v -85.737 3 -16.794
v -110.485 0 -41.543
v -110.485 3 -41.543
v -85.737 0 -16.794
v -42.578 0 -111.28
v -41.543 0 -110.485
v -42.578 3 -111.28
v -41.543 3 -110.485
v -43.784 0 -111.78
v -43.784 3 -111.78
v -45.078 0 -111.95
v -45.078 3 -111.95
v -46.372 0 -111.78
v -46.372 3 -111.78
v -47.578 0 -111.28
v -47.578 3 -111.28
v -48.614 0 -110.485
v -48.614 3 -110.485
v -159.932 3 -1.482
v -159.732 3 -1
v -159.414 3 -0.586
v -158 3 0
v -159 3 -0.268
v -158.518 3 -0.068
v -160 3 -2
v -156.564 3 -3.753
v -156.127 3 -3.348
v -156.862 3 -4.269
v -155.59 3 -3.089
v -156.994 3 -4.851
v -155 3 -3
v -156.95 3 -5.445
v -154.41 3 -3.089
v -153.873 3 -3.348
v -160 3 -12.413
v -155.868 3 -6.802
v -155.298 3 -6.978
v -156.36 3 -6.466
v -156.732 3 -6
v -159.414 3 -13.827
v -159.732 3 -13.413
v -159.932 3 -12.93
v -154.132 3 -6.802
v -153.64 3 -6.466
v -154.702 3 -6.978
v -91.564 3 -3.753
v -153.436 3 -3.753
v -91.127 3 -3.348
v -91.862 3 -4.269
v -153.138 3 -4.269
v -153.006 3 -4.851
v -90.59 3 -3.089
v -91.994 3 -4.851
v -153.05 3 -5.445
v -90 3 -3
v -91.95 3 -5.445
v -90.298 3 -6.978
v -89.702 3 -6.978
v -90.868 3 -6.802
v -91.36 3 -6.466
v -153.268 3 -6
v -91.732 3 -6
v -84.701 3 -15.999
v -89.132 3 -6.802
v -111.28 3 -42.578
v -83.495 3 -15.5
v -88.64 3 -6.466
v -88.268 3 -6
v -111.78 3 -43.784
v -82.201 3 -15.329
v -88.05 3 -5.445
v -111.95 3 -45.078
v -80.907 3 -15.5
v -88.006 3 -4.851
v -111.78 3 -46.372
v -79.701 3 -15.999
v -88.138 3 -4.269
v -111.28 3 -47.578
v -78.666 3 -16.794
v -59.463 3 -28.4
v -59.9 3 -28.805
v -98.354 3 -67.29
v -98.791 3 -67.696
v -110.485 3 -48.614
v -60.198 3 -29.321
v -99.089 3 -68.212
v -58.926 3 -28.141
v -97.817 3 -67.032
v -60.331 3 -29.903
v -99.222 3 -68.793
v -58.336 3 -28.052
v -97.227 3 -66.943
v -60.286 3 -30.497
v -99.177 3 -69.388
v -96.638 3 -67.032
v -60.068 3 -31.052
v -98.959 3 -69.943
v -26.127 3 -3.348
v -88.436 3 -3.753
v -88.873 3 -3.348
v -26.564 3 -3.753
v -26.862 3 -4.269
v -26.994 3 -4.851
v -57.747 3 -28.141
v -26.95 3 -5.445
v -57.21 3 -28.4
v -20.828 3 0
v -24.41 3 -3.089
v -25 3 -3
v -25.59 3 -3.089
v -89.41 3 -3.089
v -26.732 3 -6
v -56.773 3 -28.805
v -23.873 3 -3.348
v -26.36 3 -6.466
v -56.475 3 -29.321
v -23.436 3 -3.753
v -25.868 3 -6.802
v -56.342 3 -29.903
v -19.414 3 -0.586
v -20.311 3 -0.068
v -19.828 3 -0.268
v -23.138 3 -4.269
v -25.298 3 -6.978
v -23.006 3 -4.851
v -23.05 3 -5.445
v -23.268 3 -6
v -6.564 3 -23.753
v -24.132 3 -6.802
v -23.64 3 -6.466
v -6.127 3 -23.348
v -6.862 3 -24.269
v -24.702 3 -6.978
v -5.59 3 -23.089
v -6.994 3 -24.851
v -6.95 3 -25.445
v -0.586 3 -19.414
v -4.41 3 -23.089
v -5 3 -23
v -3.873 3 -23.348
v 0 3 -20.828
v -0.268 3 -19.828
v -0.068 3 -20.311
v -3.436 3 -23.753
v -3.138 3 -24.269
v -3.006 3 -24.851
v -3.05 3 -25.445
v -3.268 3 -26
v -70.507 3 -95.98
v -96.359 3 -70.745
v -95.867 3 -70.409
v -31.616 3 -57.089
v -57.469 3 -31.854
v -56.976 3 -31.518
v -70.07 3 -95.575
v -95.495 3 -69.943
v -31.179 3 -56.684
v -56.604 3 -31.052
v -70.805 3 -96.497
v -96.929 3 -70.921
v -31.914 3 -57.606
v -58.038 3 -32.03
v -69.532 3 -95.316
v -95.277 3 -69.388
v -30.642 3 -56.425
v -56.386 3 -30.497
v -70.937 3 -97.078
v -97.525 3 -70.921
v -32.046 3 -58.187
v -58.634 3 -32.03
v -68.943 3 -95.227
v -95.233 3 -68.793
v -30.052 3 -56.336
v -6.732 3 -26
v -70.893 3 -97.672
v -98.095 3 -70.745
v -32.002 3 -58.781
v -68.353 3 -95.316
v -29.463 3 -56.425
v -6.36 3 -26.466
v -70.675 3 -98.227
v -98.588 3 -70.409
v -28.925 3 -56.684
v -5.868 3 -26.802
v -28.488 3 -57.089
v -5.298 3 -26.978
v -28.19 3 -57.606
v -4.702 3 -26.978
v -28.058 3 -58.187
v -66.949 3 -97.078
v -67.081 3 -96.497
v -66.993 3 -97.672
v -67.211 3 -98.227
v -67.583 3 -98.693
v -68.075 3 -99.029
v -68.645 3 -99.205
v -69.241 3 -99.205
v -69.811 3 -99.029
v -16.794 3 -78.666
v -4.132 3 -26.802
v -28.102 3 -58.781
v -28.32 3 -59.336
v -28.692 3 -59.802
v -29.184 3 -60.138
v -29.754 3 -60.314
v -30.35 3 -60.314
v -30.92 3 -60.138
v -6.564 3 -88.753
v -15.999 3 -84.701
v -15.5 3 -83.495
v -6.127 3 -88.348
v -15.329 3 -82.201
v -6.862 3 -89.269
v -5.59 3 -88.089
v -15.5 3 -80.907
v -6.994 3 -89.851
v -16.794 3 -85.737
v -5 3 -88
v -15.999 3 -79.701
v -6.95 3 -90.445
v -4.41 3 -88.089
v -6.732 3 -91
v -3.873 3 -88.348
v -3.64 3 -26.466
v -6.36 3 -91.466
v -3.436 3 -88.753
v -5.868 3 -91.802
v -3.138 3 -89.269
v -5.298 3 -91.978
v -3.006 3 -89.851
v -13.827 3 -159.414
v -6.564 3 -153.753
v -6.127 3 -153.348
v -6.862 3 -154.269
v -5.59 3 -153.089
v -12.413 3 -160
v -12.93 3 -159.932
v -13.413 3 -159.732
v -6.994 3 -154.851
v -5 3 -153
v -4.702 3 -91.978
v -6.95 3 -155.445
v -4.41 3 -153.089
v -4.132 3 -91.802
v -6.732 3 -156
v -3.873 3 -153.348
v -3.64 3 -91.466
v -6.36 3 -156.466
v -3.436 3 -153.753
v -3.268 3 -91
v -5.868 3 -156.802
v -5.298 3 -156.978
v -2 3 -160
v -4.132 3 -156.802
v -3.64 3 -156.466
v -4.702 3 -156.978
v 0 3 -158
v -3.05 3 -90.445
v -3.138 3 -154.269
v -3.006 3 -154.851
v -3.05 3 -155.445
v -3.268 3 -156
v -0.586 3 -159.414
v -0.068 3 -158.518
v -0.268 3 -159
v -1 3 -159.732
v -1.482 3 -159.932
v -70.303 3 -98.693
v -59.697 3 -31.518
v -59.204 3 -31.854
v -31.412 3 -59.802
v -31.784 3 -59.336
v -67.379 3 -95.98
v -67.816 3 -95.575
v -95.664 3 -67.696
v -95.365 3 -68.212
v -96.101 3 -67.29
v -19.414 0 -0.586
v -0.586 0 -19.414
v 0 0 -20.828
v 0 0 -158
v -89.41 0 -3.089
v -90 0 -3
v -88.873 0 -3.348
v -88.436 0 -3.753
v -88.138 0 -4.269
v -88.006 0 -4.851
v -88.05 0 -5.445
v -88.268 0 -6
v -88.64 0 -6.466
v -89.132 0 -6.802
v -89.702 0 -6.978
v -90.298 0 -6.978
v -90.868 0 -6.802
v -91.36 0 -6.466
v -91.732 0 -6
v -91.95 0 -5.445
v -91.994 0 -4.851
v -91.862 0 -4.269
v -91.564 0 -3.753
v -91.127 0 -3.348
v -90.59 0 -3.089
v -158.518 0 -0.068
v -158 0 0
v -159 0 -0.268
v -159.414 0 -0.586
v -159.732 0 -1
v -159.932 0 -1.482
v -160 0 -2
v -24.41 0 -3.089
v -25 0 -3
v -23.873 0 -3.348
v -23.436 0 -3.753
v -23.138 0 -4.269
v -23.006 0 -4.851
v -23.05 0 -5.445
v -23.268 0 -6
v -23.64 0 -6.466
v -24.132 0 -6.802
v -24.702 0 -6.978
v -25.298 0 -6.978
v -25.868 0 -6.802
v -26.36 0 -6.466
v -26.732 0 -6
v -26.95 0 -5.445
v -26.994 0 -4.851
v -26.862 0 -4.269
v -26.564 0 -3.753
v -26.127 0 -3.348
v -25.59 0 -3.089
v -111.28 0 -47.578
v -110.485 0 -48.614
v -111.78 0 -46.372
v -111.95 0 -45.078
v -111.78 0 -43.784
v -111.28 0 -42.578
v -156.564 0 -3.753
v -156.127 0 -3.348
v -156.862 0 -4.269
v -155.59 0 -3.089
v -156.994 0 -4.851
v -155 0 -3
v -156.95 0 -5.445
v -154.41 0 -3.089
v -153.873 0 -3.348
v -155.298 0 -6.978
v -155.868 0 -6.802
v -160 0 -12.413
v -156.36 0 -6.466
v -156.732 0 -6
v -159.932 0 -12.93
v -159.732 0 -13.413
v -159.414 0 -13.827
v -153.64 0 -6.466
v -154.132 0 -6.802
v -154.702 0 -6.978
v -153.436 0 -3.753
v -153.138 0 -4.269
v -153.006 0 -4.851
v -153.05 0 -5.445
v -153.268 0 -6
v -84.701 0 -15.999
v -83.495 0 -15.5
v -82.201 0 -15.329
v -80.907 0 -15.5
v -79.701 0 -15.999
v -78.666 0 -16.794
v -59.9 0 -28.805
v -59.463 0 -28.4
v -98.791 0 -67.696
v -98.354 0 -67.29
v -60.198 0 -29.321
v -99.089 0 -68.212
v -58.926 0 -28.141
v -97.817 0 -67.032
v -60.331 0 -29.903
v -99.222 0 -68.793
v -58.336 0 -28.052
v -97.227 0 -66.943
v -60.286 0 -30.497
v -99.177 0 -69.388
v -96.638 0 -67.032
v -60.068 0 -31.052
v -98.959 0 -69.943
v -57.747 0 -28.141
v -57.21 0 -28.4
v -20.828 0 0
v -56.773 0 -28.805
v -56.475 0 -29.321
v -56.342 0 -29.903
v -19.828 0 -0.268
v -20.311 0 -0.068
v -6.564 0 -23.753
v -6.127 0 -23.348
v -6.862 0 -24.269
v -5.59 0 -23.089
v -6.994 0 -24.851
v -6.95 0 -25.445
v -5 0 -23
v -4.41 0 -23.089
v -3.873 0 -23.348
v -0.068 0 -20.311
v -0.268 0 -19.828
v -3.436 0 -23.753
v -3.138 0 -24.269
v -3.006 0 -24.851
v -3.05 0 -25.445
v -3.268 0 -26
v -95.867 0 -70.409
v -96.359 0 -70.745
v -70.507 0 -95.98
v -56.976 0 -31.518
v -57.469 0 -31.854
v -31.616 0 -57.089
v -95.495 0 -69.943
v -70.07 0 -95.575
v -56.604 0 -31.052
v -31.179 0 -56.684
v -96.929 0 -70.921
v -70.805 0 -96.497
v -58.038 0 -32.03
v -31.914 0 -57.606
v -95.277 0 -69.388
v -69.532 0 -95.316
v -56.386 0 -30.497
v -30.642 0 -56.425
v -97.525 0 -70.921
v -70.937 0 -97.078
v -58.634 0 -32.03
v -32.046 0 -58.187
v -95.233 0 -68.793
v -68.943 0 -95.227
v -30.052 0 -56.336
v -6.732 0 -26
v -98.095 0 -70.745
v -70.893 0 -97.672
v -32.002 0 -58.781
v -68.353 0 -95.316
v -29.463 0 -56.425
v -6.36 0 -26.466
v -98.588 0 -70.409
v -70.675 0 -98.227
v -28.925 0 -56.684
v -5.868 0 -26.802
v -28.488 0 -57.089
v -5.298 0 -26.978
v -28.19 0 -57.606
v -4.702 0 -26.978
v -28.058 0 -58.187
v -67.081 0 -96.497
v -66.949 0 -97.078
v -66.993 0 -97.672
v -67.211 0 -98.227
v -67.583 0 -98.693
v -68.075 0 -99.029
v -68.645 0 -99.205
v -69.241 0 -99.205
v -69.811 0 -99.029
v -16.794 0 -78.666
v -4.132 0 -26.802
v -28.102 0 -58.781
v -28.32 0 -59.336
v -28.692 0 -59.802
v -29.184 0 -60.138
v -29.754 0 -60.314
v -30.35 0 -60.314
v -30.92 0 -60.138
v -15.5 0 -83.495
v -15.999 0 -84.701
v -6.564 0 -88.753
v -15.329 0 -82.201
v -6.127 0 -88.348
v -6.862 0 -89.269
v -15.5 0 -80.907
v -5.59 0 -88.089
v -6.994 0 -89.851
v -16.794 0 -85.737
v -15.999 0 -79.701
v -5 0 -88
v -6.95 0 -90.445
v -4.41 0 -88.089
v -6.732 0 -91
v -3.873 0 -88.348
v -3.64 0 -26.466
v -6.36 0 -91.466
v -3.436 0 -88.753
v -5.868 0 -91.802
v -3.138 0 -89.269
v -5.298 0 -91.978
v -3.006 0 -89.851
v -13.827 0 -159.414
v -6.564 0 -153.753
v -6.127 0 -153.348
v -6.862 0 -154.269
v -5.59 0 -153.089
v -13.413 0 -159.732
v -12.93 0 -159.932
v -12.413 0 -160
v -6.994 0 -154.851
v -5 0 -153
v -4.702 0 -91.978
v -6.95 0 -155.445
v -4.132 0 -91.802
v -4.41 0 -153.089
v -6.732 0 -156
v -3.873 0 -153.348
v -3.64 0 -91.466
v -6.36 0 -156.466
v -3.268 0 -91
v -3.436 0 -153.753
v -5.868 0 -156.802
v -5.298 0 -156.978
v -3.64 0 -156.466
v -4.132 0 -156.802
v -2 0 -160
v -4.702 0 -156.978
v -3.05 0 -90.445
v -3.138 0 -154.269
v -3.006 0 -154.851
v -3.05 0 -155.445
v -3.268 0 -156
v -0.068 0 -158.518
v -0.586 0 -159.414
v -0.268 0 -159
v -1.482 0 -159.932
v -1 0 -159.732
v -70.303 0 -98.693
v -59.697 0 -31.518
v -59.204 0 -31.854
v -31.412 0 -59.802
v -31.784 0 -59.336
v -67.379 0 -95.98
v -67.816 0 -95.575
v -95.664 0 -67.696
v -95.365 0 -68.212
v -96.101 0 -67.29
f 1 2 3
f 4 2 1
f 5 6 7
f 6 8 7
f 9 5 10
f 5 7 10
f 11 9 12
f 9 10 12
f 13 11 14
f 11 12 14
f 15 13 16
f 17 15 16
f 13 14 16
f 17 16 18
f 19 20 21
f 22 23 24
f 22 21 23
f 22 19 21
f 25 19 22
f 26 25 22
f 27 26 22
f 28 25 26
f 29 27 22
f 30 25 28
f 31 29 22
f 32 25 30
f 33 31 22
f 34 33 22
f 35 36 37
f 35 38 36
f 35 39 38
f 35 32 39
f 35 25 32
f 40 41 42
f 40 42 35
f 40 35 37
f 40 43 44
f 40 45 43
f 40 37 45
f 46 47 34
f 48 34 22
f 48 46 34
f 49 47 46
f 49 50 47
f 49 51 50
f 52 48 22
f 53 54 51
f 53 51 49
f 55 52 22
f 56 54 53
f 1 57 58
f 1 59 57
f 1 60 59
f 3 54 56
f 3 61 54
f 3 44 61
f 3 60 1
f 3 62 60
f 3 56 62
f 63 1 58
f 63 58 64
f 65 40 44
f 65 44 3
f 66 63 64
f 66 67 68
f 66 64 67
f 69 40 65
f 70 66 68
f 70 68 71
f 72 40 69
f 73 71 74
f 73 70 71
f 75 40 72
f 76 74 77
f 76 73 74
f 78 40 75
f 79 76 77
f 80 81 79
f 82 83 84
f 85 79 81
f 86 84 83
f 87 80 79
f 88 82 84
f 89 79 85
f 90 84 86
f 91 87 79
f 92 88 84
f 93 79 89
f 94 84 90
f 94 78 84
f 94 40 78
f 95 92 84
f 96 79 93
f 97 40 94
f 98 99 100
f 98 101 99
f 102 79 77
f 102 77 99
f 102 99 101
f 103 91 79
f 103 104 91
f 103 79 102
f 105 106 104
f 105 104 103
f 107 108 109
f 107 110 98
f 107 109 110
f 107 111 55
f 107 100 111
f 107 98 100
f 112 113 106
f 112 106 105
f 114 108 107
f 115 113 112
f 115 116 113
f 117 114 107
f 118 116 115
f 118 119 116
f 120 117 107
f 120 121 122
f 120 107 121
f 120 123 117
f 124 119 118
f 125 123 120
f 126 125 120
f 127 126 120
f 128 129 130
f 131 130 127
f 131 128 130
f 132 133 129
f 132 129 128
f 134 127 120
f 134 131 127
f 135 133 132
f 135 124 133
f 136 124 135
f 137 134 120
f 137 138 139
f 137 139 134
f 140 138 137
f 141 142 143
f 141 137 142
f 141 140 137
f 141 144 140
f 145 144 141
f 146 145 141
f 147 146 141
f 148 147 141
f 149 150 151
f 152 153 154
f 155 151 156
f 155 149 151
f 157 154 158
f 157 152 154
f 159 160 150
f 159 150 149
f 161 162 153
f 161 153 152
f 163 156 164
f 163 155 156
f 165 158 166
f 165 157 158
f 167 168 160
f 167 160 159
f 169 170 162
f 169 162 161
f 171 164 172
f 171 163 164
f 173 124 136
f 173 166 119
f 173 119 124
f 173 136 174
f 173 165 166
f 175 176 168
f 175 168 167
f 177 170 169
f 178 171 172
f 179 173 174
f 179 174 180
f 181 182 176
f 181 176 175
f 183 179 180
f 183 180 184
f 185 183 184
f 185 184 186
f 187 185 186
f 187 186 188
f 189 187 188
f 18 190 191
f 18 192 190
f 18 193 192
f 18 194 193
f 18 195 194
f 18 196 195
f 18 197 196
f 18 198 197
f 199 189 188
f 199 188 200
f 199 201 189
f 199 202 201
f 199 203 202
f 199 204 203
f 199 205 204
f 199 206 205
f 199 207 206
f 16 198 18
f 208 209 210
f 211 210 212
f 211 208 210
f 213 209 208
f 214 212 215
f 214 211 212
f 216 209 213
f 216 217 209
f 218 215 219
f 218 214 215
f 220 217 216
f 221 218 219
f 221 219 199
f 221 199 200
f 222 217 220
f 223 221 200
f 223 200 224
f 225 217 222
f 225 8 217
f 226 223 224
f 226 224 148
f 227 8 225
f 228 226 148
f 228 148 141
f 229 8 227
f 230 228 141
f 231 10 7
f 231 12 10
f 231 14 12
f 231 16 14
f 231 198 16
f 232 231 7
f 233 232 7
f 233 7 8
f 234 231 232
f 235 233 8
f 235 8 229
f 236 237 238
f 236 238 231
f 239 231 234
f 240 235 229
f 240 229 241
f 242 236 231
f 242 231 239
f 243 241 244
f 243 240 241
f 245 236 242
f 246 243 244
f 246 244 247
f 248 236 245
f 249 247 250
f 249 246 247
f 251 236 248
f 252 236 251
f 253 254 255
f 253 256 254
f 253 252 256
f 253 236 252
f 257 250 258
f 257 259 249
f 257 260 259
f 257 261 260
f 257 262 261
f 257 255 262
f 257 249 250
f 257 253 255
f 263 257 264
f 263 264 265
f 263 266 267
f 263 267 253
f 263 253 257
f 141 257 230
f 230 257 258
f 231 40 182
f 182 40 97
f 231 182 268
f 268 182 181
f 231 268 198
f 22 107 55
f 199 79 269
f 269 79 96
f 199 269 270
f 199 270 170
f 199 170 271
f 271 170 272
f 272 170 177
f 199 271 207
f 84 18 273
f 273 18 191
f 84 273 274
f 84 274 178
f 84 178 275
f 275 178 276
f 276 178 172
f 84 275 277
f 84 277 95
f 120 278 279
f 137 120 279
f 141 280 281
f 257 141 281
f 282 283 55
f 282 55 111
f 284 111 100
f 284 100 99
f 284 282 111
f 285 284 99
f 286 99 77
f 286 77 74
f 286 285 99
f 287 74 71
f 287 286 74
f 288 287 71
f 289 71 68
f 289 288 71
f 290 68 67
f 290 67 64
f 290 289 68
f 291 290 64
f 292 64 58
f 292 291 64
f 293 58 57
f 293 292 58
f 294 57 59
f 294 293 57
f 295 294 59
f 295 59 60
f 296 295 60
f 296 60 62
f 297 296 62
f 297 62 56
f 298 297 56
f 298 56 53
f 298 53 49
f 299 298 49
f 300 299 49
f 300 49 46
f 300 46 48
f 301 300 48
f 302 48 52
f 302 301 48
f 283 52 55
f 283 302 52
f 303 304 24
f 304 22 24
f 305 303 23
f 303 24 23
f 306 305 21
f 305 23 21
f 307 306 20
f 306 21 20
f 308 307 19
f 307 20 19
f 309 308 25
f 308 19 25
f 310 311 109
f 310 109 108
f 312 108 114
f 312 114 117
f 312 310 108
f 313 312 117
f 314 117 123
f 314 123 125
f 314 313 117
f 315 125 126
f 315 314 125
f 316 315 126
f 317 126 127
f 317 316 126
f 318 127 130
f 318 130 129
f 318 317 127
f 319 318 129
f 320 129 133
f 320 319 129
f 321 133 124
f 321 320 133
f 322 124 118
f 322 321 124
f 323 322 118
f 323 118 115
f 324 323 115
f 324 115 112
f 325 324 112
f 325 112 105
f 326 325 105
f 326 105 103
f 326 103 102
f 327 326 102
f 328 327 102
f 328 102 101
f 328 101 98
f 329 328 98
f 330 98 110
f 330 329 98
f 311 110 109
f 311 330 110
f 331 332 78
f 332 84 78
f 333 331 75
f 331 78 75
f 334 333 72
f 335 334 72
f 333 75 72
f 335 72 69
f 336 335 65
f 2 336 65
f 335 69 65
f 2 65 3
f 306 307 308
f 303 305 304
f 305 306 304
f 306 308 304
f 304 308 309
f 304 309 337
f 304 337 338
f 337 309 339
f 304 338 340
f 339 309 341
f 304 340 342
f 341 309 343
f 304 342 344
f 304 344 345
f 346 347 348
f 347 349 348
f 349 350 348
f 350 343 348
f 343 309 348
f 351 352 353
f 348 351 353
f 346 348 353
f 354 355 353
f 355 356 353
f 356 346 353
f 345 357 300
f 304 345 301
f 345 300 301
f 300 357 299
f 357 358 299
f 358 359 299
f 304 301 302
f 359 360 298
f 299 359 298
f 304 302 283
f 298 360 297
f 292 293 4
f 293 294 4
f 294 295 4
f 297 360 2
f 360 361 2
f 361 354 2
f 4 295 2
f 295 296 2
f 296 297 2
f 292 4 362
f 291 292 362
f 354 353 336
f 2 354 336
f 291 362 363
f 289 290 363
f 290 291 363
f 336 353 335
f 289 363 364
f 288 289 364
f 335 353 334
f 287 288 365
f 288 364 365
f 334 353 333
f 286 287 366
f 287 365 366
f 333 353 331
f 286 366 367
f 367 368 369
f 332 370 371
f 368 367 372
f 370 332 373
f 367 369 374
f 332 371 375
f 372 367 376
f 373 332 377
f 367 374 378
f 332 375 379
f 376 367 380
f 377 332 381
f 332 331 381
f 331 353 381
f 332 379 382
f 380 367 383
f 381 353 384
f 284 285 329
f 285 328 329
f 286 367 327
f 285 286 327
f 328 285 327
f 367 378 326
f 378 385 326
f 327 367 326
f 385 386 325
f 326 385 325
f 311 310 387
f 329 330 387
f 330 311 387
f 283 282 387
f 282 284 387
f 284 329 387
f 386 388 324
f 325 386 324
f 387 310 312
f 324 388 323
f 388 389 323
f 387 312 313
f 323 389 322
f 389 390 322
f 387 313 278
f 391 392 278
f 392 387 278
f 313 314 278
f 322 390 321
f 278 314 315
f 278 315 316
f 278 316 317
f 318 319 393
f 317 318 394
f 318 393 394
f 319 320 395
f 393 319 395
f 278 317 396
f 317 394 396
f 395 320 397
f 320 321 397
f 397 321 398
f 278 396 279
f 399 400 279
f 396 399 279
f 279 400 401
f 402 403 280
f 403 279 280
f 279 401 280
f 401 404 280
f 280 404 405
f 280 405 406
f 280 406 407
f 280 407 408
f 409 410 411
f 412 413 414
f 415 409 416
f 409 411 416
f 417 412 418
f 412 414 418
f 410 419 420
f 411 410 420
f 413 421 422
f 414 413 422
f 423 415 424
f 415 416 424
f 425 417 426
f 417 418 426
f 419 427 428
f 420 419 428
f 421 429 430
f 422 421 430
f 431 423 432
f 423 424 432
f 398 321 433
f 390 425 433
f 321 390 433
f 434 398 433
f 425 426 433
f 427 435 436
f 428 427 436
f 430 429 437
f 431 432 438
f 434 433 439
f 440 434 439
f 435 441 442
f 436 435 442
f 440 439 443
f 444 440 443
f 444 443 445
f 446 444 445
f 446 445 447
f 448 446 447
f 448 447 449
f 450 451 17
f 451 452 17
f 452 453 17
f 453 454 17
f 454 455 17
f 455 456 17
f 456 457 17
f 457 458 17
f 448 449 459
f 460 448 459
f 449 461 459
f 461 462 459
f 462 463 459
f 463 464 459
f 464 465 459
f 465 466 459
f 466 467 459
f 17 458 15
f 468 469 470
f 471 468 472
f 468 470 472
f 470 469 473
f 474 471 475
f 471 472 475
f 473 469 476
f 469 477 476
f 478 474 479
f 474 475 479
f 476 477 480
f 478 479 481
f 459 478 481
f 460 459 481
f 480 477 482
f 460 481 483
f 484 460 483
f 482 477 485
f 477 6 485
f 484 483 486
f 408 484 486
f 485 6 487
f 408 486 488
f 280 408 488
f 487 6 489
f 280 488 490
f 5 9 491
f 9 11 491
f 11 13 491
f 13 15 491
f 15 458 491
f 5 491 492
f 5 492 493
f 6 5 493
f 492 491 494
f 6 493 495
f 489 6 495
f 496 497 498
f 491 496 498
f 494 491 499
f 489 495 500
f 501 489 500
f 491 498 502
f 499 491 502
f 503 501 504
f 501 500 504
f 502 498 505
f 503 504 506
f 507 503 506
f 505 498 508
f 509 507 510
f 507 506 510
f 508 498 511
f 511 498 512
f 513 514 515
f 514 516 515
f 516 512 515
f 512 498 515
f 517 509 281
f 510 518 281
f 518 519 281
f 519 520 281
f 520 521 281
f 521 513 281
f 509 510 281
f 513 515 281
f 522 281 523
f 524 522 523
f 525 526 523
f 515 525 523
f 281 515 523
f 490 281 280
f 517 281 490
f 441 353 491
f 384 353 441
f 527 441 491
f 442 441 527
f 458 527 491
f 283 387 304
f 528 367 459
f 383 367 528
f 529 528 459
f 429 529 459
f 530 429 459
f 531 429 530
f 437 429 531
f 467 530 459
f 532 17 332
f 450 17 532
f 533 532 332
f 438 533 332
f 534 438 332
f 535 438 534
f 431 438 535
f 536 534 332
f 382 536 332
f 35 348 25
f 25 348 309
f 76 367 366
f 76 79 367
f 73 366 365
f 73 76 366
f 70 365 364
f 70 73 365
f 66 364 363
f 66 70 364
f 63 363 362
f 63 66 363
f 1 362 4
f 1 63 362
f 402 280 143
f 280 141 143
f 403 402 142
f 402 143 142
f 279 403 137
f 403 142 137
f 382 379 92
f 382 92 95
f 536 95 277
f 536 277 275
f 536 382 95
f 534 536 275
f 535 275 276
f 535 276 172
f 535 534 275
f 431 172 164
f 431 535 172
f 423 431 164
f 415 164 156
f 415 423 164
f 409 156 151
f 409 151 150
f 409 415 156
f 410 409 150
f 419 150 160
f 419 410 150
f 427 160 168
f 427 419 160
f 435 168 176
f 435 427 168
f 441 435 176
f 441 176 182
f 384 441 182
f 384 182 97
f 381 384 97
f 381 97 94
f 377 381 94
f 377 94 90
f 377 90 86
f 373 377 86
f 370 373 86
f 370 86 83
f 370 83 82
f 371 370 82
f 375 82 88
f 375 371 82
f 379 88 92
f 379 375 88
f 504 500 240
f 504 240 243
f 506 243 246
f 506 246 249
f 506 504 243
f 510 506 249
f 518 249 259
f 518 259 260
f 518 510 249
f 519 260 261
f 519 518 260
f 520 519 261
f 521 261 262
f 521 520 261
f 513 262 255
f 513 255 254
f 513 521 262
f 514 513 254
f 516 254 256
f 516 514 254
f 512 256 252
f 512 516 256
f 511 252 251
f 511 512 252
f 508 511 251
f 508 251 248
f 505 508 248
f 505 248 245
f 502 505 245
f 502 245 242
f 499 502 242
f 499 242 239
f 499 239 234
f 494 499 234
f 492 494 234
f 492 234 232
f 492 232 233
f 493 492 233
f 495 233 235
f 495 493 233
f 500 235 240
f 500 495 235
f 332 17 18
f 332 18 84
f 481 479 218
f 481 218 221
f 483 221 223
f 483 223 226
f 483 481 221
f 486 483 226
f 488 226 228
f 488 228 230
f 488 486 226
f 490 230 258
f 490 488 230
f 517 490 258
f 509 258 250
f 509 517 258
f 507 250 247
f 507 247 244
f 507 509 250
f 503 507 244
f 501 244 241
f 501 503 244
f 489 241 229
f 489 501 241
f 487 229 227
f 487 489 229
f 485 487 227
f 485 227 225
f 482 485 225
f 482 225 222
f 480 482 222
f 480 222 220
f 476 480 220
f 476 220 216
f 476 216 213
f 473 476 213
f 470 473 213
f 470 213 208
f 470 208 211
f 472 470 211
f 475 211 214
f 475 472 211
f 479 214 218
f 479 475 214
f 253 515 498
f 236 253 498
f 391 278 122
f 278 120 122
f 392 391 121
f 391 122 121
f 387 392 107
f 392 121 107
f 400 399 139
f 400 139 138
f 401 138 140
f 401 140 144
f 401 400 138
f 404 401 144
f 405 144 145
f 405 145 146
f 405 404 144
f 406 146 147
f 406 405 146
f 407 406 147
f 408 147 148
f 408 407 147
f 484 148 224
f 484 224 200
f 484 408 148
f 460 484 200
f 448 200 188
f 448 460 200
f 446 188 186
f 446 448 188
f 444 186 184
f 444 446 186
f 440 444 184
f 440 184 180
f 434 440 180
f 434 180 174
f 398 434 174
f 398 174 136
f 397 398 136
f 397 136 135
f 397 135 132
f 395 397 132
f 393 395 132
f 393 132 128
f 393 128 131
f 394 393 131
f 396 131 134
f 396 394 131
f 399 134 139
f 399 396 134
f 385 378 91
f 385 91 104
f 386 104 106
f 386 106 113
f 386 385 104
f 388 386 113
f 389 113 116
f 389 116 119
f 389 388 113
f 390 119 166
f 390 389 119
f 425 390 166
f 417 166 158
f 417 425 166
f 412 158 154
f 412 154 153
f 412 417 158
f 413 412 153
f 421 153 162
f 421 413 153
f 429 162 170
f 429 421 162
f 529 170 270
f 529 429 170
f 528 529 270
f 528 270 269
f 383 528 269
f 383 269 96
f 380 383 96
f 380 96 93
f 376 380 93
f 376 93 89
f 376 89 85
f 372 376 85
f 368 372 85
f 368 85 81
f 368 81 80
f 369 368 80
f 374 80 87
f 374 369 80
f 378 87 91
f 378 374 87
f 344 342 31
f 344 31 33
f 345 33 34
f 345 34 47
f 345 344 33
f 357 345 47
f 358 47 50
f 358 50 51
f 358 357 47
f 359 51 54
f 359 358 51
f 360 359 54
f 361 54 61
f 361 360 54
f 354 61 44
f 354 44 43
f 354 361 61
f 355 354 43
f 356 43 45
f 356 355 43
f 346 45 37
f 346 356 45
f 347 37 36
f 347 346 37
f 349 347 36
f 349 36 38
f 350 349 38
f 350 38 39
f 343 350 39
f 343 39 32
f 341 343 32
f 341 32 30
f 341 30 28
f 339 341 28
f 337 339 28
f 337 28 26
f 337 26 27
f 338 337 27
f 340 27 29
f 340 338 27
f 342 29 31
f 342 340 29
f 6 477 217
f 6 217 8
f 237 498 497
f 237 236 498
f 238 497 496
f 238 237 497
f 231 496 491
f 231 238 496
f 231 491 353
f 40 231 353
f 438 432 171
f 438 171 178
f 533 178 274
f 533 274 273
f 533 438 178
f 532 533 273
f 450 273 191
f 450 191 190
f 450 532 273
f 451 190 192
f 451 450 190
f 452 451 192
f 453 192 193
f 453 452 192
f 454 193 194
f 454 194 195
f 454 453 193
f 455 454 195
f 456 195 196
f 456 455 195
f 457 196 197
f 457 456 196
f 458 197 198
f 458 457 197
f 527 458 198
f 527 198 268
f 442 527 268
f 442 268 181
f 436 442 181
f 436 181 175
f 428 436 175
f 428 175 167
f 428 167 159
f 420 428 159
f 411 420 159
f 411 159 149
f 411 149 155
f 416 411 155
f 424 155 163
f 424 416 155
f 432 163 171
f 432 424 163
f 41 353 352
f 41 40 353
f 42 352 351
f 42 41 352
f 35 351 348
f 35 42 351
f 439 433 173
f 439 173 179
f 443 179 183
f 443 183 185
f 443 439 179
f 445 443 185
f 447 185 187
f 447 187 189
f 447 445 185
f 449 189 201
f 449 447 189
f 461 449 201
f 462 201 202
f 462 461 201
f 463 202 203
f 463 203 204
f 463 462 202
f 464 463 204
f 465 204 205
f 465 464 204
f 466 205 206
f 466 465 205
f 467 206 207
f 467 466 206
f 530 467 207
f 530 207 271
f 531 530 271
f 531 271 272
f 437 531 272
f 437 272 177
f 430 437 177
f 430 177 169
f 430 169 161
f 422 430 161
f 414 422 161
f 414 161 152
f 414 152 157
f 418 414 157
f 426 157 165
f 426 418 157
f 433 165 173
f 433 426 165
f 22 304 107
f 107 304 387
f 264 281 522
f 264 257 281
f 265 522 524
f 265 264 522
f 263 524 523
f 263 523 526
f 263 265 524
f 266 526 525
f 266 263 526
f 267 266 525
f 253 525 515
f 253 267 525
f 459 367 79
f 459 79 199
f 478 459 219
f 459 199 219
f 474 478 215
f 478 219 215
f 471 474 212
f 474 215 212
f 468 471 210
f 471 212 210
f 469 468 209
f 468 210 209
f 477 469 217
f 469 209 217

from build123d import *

# Parameters (mm, degrees)
SKETCH_1_R      = 2
EXTRUDE_1_DEPTH = 3
FILLET_1_R      = 2
FILLET_2_R      = 5


with BuildPart() as part:
    # ｽｹｯﾁ1 → ﾎﾞｽ - 押し出し1 (new body)
    with BuildSketch(Plane(origin=(0, 0, 0), x_dir=(1, 0, 0), z_dir=(0, 1, 0))):
        Polygon((0, 20), (0, 160), (-10, 160), (-13.241161391, 160), (-45.078057301, 128.16310409), (-128.16310409, 45.078057301), (-160, 13.241161391), (-160, 10), (-160, 0), (-20, 0), align=None)
        with Locations(Location((-5, 25, 0), (0, 0, 270))):
            Circle(SKETCH_1_R, mode=Mode.SUBTRACT)
        with Locations(Location((-5, 90, 0), (0, 0, 270))):
            Circle(SKETCH_1_R, mode=Mode.SUBTRACT)
        with Locations(Location((-90, 5, 0), (0, 0, 270))):
            Circle(SKETCH_1_R, mode=Mode.SUBTRACT)
        with Locations(Location((-25, 5, 0), (0, 0, 270))):
            Circle(SKETCH_1_R, mode=Mode.SUBTRACT)
        with Locations(Location((-68.942911166, 97.227182413, 0), (0, 0, 270))):
            Circle(SKETCH_1_R, mode=Mode.SUBTRACT)
        with Locations(Location((-30.0520382, 58.336309448, 0), (0, 0, 270))):
            Circle(SKETCH_1_R, mode=Mode.SUBTRACT)
        with Locations(Location((-58.336309448, 30.0520382, 0), (0, 0, 270))):
            Circle(SKETCH_1_R, mode=Mode.SUBTRACT)
        with Locations(Location((-97.227182413, 68.942911166, 0), (0, 0, 270))):
            Circle(SKETCH_1_R, mode=Mode.SUBTRACT)
        with Locations(Location((-5, 155, 0), (0, 0, 270))):
            Circle(SKETCH_1_R, mode=Mode.SUBTRACT)
        with Locations(Location((-155, 5, 0), (0, 0, 270))):
            Circle(SKETCH_1_R, mode=Mode.SUBTRACT)
        Polygon((-82.201163313, 13.258252147), (-13.258252147, 82.201163313), (-45.078057301, 114.020968466), (-114.020968466, 45.078057301), align=None, mode=Mode.SUBTRACT)
    extrude(amount=EXTRUDE_1_DEPTH)

    # ﾌｨﾚｯﾄ1
    fillet_1_edges = [part.edges().sort_by_distance(p)[0] for p in [
        (-13.241161391, 1.5, -160),
        (0, 1.5, -160),
        (0, 1.5, -20),
        (-20, 1.5, 0),
        (-160, 1.5, 0),
        (-160, 1.5, -13.241161391),
    ]]
    fillet(fillet_1_edges, radius=FILLET_1_R)

    # ﾌｨﾚｯﾄ2
    fillet_2_edges = [part.edges().sort_by_distance(p)[0] for p in [
        (-82.201163313, 1.5, -13.258252147),
        (-13.258252147, 1.5, -82.201163313),
        (-45.078057301, 1.5, -114.020968466),
        (-114.020968466, 1.5, -45.078057301),
    ]]
    fillet(fillet_2_edges, radius=FILLET_2_R)


solid = part.part
